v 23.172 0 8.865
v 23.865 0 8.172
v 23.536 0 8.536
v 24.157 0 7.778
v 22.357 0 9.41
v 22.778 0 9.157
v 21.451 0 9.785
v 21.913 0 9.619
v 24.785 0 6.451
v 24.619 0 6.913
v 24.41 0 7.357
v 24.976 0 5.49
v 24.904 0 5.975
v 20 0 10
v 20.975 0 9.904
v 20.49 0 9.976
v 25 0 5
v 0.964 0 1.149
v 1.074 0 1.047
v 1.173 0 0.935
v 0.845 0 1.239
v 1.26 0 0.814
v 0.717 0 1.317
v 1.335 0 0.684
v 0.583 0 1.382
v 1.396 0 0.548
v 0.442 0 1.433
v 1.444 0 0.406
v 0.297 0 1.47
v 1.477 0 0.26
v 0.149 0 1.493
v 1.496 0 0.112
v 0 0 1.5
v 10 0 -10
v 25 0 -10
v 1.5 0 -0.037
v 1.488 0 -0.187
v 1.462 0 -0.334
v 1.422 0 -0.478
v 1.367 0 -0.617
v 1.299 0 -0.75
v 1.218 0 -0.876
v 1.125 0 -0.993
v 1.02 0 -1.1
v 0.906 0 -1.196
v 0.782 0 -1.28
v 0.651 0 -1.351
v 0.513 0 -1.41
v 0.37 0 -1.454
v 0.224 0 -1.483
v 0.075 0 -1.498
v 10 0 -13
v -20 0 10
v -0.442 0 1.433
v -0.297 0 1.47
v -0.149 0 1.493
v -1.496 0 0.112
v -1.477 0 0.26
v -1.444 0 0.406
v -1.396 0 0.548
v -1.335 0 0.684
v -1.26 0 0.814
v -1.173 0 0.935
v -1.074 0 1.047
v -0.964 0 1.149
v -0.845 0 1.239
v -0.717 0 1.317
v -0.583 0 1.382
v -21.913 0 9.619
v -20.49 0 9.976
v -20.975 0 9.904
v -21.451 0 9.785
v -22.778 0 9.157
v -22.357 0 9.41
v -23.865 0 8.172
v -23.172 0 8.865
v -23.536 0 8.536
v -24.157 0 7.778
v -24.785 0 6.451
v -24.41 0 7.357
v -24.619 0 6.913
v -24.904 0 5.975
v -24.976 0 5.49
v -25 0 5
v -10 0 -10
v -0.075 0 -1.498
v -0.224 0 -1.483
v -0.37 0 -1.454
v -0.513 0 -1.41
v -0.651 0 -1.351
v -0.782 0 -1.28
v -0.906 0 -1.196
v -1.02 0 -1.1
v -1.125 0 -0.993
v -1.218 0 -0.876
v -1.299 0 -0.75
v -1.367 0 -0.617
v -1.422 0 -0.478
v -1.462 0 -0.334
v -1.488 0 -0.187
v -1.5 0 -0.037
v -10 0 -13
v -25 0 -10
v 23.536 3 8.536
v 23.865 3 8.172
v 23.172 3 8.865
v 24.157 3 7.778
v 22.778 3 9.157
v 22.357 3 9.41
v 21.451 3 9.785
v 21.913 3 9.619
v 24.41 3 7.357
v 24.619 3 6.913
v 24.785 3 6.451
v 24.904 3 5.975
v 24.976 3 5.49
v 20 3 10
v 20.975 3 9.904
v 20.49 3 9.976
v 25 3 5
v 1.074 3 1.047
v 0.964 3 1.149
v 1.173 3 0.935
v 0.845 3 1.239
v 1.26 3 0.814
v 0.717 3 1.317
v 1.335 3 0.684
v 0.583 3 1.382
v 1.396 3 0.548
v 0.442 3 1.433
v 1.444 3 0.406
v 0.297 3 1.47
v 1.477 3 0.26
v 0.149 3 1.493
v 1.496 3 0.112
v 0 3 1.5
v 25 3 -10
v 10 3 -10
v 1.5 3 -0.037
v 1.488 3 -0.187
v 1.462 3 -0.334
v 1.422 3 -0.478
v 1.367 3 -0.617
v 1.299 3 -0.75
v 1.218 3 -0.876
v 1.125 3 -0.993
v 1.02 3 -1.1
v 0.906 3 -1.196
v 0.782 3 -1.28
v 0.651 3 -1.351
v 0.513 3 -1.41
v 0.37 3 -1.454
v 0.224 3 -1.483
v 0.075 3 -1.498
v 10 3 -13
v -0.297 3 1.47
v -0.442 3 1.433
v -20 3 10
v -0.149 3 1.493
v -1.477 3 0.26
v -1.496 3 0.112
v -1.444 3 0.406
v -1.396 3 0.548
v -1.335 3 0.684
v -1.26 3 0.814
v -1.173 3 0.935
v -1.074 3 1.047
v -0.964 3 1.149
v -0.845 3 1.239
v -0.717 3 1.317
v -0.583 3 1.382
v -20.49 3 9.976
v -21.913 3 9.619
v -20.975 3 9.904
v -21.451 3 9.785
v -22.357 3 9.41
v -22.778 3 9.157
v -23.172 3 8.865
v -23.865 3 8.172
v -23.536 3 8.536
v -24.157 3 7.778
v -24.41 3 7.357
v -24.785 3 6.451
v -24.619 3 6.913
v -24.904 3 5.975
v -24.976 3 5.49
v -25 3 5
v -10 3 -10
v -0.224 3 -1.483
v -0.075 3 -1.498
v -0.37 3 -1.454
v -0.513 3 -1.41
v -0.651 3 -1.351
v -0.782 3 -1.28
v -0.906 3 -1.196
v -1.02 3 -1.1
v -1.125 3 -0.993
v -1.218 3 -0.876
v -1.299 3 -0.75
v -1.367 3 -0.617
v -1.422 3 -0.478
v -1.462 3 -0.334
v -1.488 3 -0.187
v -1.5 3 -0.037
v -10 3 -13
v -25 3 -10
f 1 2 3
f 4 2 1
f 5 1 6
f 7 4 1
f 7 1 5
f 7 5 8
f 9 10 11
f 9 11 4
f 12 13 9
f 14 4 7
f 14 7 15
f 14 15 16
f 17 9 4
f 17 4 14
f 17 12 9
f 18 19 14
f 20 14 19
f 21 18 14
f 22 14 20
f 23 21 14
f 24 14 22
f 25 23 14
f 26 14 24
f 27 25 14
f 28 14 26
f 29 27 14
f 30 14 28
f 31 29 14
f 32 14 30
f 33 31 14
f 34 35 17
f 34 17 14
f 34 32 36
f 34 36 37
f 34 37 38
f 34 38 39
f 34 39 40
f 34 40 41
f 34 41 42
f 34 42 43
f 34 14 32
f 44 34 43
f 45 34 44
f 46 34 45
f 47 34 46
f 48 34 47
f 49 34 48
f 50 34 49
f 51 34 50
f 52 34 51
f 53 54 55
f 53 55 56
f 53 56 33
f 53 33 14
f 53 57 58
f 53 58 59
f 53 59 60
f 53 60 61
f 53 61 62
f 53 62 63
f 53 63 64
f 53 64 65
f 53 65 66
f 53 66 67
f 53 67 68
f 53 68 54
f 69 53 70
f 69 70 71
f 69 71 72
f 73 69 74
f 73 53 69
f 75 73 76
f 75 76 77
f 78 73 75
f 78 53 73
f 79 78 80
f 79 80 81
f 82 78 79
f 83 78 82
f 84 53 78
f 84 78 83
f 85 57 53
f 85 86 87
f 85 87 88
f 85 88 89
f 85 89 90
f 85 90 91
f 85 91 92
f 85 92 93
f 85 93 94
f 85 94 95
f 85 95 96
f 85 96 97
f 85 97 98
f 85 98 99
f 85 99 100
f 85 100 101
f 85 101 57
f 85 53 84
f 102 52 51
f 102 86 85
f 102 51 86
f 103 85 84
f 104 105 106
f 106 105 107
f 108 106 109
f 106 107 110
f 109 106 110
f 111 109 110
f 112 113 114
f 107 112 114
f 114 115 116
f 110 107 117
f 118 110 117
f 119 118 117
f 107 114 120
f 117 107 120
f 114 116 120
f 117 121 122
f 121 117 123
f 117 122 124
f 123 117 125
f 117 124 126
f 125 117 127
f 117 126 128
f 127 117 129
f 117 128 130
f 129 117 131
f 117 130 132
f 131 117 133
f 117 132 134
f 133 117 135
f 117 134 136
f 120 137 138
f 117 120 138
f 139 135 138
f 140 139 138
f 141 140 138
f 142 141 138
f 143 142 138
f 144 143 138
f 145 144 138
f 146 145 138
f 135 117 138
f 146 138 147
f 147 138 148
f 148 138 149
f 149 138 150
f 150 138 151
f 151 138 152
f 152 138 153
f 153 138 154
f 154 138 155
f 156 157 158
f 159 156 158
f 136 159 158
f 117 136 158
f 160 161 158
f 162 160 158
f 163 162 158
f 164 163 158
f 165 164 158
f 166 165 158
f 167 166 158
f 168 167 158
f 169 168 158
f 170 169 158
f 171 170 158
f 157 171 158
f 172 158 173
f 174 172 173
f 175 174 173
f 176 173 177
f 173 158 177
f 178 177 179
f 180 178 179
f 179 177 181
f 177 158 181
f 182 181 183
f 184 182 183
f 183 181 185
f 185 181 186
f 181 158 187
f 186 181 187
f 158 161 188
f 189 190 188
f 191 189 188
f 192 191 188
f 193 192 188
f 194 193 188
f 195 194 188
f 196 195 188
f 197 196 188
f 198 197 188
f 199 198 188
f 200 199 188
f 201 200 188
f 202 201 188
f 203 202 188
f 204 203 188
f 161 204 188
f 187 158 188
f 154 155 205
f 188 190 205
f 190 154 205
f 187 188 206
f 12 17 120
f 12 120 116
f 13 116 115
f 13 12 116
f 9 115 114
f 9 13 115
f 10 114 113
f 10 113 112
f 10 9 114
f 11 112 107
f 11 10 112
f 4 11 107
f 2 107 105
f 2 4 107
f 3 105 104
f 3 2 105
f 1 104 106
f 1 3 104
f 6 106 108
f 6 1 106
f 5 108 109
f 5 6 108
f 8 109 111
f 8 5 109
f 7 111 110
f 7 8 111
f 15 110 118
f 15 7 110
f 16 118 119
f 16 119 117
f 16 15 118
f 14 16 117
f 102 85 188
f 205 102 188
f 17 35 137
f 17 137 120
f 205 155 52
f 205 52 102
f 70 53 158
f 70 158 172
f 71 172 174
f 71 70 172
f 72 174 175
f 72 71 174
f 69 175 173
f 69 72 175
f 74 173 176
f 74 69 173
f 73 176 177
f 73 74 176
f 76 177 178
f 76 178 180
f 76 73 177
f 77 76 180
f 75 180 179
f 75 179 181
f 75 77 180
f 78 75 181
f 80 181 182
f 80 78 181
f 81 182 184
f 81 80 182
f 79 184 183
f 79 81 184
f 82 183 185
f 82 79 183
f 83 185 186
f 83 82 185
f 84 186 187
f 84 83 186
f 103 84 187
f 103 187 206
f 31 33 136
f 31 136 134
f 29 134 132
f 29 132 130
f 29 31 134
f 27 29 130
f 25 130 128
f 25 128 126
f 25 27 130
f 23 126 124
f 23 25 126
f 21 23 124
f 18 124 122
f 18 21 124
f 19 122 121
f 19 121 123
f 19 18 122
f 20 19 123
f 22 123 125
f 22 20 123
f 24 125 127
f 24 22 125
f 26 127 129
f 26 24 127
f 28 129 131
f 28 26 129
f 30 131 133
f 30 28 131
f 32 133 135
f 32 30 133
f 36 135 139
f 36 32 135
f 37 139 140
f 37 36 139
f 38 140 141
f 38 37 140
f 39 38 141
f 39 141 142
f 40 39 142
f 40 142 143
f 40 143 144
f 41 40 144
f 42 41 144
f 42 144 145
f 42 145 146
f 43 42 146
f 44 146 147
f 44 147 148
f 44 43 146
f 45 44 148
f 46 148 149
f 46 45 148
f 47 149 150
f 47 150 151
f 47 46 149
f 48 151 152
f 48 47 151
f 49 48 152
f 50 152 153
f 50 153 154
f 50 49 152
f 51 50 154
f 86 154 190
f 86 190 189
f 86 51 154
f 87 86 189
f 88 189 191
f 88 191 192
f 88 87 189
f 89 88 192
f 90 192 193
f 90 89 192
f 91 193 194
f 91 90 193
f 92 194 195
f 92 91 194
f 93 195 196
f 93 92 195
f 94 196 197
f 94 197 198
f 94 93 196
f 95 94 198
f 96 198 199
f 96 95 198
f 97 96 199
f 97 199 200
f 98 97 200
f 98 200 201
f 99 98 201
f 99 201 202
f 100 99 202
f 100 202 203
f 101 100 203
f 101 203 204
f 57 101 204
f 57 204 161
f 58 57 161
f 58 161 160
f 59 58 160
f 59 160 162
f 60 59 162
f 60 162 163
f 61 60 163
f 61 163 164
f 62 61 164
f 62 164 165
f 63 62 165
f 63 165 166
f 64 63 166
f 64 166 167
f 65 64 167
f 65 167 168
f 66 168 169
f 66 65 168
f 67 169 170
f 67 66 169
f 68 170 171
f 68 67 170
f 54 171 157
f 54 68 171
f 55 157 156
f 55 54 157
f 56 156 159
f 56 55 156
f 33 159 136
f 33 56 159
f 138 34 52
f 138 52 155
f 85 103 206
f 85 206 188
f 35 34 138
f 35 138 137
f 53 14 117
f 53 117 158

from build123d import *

# Parameters (mm, degrees)
CROQUIS1_R              = 1.5
SALIENTE_EXTRUIR1_DEPTH = 3
CROQUIS2_W              = 20
CROQUIS2_H              = 3
SALIENTE_EXTRUIR2_DEPTH = 3


with BuildPart() as part:
    # Croquis1 → Saliente-Extruir1 (new body)
    with BuildSketch(Plane(origin=(0, 0, 0), x_dir=(1, 0, 0), z_dir=(0, 1, 0))):
        with BuildLine():
            Line((20, -10), (-20, -10))
            ThreePointArc((-20, -10), (-23.535533906, -8.535533906), (-25, -5))
            Line((-25, -5), (-25, 10))
            Line((-25, 10), (25, 10))
            Line((25, 10), (25, -5))
            ThreePointArc((25, -5), (23.535533906, -8.535533906), (20, -10))
        make_face()
        with Locations(Location((0, 0, 0), (0, 0, 270))):
            Circle(CROQUIS1_R, mode=Mode.SUBTRACT)
    extrude(amount=SALIENTE_EXTRUIR1_DEPTH)

    # Croquis2 → Saliente-Extruir2 (add)
    with BuildSketch(Plane(origin=(0, 0, -10), x_dir=(-1, 0, 0), z_dir=(0, 0, -1))):
        with Locations((0, 1.5)):
            Rectangle(CROQUIS2_W, CROQUIS2_H)
    extrude(amount=SALIENTE_EXTRUIR2_DEPTH)


solid = part.part
